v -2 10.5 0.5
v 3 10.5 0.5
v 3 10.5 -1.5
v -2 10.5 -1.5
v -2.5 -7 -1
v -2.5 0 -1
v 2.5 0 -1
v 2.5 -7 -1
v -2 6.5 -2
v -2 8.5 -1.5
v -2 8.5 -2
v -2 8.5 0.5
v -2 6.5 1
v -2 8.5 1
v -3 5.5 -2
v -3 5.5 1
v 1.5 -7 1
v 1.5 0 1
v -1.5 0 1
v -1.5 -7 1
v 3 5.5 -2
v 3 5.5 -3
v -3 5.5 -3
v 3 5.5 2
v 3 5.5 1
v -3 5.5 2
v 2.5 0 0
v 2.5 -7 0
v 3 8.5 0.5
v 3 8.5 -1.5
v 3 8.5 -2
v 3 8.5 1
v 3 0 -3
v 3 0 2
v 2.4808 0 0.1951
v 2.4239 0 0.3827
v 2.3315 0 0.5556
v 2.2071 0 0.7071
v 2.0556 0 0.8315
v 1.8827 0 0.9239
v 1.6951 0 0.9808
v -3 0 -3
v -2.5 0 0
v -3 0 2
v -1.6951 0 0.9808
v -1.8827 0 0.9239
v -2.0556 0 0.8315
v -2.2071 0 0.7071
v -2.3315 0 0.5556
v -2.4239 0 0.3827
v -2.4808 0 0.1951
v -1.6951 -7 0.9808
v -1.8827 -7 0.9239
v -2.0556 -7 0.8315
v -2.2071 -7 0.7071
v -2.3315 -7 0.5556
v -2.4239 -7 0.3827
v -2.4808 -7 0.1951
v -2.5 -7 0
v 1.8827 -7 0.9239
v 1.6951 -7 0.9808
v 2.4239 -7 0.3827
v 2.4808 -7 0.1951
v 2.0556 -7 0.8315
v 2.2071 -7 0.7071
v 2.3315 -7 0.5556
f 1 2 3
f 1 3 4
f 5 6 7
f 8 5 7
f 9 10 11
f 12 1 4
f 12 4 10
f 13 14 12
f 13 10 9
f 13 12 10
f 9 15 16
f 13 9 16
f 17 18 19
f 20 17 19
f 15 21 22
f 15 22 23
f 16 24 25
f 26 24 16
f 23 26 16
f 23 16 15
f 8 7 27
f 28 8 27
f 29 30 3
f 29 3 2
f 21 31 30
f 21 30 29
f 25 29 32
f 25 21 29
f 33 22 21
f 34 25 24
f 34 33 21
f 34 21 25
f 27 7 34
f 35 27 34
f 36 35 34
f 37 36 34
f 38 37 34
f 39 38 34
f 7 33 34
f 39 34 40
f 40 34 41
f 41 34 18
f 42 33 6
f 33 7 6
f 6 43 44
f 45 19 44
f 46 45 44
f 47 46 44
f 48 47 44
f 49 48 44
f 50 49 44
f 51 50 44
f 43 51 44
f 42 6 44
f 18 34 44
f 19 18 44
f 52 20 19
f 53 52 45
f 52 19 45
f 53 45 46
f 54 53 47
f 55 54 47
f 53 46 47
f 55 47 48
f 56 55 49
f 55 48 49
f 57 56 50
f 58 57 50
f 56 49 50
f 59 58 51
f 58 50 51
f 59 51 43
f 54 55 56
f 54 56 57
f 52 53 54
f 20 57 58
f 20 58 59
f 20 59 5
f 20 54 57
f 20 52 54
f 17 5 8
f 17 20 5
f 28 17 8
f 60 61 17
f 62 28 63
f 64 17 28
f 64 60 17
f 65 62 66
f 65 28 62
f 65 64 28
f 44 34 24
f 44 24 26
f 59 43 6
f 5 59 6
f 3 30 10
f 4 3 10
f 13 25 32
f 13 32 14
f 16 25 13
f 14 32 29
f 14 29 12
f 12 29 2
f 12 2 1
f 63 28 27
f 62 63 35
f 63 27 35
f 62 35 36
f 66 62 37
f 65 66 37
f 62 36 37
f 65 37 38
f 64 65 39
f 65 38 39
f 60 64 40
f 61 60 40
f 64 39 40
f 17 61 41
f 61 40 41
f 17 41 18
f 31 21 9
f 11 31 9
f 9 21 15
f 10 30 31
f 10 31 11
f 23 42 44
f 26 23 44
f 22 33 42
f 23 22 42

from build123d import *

# Parameters (mm, degrees)
F1_DEPTH = 7
F2_W     = 6
F2_H     = 5
F3_DEPTH = 5.5
F4_W     = 6
F4_H     = 3
F5_DEPTH = 3
F6_W     = 6
F6_H     = 2
F7_DEPTH = 2
F9_DEPTH = 1
F10_SIZE = 0.99999


# Not quite as in the source:
# - a fillet or chamfer is up to 0.001 mm smaller than in the source, because OpenCascade refuses the exact size


with BuildPart() as f1:
    # F0 (on Front) → F1 (new body)
    with BuildSketch(Plane.XZ):
        with BuildLine():
            Line((-2.5, -1), (2.5, -1))
            Line((2.5, -1), (2.5, 0))
            ThreePointArc((2.5, 0), (2.2071067812, 0.7071067812), (1.5, 1))
            Line((1.5, 1), (-1.5, 1))
            ThreePointArc((-1.5, 1), (-2.2071067812, 0.7071067812), (-2.5, 0))
            Line((-2.5, 0), (-2.5, -1))
        make_face()
    extrude(amount=F1_DEPTH)

    # F2 (on face) → F3 (join)
    with BuildSketch(Plane(origin=(0, 0, 0), x_dir=(-1, 0, 0), z_dir=(0, 1, 0))):
        with Locations((0, -0.5)):
            Rectangle(F2_W, F2_H)
        with BuildLine():
            ThreePointArc((1.5, 1), (2.2071067812, 0.7071067812), (2.5, 0))
            Line((2.5, 0), (2.5, -1))
            Line((2.5, -1), (-2.5, -1))
            Line((-2.5, -1), (-2.5, 0))
            ThreePointArc((-2.5, 0), (-2.2071067812, 0.7071067812), (-1.5, 1))
            Line((-1.5, 1), (1.5, 1))
        make_face(mode=Mode.SUBTRACT)
        with BuildLine():
            Line((2.5, -1), (2.5, 0))
            ThreePointArc((2.5, 0), (2.2071067812, 0.7071067812), (1.5, 1))
            Line((1.5, 1), (-1.5, 1))
            ThreePointArc((-1.5, 1), (-2.2071067812, 0.7071067812), (-2.5, 0))
            Line((-2.5, 0), (-2.5, -1))
            Line((-2.5, -1), (2.5, -1))
        make_face()
    extrude(amount=F3_DEPTH)

    # F4 (on face) → F5 (join)
    with BuildSketch(Plane(origin=(0, 5.5, 0), x_dir=(-1, 0, 0), z_dir=(0, 1, 0))):
        with Locations((0, -0.5)):
            Rectangle(F4_W, F4_H)
    extrude(amount=F5_DEPTH)

    # F6 (on face) → F7 (join)
    with BuildSketch(Plane(origin=(0, 8.5, 0), x_dir=(-1, 0, 0), z_dir=(0, 1, 0))):
        with Locations((0, -0.5)):
            Rectangle(F6_W, F6_H)
    extrude(amount=F7_DEPTH)

    # F8 (on face) → F9 (cut)
    with BuildSketch(Plane(origin=(-3, 0, 0), x_dir=(0, -1, 0), z_dir=(-1, 0, 0))):
        Polygon((-5.5, -2), (-5.5, 1), (-8.5, 1), (-8.5, 0.5), (-10.5, 0.5), (-10.5, -1.5), (-8.5, -1.5), (-8.5, -2), align=None)
    extrude(amount=-F9_DEPTH, mode=Mode.SUBTRACT)

    # F10 (size 1 in the source; OpenCascade refuses exactly that, so slightly less here)
    f10_edges = [f1.edges().sort_by_distance(p)[0] for p in [
        (-2, 5.5, -0.5),
    ]]
    chamfer(f10_edges, length=F10_SIZE)


solid = f1.part
